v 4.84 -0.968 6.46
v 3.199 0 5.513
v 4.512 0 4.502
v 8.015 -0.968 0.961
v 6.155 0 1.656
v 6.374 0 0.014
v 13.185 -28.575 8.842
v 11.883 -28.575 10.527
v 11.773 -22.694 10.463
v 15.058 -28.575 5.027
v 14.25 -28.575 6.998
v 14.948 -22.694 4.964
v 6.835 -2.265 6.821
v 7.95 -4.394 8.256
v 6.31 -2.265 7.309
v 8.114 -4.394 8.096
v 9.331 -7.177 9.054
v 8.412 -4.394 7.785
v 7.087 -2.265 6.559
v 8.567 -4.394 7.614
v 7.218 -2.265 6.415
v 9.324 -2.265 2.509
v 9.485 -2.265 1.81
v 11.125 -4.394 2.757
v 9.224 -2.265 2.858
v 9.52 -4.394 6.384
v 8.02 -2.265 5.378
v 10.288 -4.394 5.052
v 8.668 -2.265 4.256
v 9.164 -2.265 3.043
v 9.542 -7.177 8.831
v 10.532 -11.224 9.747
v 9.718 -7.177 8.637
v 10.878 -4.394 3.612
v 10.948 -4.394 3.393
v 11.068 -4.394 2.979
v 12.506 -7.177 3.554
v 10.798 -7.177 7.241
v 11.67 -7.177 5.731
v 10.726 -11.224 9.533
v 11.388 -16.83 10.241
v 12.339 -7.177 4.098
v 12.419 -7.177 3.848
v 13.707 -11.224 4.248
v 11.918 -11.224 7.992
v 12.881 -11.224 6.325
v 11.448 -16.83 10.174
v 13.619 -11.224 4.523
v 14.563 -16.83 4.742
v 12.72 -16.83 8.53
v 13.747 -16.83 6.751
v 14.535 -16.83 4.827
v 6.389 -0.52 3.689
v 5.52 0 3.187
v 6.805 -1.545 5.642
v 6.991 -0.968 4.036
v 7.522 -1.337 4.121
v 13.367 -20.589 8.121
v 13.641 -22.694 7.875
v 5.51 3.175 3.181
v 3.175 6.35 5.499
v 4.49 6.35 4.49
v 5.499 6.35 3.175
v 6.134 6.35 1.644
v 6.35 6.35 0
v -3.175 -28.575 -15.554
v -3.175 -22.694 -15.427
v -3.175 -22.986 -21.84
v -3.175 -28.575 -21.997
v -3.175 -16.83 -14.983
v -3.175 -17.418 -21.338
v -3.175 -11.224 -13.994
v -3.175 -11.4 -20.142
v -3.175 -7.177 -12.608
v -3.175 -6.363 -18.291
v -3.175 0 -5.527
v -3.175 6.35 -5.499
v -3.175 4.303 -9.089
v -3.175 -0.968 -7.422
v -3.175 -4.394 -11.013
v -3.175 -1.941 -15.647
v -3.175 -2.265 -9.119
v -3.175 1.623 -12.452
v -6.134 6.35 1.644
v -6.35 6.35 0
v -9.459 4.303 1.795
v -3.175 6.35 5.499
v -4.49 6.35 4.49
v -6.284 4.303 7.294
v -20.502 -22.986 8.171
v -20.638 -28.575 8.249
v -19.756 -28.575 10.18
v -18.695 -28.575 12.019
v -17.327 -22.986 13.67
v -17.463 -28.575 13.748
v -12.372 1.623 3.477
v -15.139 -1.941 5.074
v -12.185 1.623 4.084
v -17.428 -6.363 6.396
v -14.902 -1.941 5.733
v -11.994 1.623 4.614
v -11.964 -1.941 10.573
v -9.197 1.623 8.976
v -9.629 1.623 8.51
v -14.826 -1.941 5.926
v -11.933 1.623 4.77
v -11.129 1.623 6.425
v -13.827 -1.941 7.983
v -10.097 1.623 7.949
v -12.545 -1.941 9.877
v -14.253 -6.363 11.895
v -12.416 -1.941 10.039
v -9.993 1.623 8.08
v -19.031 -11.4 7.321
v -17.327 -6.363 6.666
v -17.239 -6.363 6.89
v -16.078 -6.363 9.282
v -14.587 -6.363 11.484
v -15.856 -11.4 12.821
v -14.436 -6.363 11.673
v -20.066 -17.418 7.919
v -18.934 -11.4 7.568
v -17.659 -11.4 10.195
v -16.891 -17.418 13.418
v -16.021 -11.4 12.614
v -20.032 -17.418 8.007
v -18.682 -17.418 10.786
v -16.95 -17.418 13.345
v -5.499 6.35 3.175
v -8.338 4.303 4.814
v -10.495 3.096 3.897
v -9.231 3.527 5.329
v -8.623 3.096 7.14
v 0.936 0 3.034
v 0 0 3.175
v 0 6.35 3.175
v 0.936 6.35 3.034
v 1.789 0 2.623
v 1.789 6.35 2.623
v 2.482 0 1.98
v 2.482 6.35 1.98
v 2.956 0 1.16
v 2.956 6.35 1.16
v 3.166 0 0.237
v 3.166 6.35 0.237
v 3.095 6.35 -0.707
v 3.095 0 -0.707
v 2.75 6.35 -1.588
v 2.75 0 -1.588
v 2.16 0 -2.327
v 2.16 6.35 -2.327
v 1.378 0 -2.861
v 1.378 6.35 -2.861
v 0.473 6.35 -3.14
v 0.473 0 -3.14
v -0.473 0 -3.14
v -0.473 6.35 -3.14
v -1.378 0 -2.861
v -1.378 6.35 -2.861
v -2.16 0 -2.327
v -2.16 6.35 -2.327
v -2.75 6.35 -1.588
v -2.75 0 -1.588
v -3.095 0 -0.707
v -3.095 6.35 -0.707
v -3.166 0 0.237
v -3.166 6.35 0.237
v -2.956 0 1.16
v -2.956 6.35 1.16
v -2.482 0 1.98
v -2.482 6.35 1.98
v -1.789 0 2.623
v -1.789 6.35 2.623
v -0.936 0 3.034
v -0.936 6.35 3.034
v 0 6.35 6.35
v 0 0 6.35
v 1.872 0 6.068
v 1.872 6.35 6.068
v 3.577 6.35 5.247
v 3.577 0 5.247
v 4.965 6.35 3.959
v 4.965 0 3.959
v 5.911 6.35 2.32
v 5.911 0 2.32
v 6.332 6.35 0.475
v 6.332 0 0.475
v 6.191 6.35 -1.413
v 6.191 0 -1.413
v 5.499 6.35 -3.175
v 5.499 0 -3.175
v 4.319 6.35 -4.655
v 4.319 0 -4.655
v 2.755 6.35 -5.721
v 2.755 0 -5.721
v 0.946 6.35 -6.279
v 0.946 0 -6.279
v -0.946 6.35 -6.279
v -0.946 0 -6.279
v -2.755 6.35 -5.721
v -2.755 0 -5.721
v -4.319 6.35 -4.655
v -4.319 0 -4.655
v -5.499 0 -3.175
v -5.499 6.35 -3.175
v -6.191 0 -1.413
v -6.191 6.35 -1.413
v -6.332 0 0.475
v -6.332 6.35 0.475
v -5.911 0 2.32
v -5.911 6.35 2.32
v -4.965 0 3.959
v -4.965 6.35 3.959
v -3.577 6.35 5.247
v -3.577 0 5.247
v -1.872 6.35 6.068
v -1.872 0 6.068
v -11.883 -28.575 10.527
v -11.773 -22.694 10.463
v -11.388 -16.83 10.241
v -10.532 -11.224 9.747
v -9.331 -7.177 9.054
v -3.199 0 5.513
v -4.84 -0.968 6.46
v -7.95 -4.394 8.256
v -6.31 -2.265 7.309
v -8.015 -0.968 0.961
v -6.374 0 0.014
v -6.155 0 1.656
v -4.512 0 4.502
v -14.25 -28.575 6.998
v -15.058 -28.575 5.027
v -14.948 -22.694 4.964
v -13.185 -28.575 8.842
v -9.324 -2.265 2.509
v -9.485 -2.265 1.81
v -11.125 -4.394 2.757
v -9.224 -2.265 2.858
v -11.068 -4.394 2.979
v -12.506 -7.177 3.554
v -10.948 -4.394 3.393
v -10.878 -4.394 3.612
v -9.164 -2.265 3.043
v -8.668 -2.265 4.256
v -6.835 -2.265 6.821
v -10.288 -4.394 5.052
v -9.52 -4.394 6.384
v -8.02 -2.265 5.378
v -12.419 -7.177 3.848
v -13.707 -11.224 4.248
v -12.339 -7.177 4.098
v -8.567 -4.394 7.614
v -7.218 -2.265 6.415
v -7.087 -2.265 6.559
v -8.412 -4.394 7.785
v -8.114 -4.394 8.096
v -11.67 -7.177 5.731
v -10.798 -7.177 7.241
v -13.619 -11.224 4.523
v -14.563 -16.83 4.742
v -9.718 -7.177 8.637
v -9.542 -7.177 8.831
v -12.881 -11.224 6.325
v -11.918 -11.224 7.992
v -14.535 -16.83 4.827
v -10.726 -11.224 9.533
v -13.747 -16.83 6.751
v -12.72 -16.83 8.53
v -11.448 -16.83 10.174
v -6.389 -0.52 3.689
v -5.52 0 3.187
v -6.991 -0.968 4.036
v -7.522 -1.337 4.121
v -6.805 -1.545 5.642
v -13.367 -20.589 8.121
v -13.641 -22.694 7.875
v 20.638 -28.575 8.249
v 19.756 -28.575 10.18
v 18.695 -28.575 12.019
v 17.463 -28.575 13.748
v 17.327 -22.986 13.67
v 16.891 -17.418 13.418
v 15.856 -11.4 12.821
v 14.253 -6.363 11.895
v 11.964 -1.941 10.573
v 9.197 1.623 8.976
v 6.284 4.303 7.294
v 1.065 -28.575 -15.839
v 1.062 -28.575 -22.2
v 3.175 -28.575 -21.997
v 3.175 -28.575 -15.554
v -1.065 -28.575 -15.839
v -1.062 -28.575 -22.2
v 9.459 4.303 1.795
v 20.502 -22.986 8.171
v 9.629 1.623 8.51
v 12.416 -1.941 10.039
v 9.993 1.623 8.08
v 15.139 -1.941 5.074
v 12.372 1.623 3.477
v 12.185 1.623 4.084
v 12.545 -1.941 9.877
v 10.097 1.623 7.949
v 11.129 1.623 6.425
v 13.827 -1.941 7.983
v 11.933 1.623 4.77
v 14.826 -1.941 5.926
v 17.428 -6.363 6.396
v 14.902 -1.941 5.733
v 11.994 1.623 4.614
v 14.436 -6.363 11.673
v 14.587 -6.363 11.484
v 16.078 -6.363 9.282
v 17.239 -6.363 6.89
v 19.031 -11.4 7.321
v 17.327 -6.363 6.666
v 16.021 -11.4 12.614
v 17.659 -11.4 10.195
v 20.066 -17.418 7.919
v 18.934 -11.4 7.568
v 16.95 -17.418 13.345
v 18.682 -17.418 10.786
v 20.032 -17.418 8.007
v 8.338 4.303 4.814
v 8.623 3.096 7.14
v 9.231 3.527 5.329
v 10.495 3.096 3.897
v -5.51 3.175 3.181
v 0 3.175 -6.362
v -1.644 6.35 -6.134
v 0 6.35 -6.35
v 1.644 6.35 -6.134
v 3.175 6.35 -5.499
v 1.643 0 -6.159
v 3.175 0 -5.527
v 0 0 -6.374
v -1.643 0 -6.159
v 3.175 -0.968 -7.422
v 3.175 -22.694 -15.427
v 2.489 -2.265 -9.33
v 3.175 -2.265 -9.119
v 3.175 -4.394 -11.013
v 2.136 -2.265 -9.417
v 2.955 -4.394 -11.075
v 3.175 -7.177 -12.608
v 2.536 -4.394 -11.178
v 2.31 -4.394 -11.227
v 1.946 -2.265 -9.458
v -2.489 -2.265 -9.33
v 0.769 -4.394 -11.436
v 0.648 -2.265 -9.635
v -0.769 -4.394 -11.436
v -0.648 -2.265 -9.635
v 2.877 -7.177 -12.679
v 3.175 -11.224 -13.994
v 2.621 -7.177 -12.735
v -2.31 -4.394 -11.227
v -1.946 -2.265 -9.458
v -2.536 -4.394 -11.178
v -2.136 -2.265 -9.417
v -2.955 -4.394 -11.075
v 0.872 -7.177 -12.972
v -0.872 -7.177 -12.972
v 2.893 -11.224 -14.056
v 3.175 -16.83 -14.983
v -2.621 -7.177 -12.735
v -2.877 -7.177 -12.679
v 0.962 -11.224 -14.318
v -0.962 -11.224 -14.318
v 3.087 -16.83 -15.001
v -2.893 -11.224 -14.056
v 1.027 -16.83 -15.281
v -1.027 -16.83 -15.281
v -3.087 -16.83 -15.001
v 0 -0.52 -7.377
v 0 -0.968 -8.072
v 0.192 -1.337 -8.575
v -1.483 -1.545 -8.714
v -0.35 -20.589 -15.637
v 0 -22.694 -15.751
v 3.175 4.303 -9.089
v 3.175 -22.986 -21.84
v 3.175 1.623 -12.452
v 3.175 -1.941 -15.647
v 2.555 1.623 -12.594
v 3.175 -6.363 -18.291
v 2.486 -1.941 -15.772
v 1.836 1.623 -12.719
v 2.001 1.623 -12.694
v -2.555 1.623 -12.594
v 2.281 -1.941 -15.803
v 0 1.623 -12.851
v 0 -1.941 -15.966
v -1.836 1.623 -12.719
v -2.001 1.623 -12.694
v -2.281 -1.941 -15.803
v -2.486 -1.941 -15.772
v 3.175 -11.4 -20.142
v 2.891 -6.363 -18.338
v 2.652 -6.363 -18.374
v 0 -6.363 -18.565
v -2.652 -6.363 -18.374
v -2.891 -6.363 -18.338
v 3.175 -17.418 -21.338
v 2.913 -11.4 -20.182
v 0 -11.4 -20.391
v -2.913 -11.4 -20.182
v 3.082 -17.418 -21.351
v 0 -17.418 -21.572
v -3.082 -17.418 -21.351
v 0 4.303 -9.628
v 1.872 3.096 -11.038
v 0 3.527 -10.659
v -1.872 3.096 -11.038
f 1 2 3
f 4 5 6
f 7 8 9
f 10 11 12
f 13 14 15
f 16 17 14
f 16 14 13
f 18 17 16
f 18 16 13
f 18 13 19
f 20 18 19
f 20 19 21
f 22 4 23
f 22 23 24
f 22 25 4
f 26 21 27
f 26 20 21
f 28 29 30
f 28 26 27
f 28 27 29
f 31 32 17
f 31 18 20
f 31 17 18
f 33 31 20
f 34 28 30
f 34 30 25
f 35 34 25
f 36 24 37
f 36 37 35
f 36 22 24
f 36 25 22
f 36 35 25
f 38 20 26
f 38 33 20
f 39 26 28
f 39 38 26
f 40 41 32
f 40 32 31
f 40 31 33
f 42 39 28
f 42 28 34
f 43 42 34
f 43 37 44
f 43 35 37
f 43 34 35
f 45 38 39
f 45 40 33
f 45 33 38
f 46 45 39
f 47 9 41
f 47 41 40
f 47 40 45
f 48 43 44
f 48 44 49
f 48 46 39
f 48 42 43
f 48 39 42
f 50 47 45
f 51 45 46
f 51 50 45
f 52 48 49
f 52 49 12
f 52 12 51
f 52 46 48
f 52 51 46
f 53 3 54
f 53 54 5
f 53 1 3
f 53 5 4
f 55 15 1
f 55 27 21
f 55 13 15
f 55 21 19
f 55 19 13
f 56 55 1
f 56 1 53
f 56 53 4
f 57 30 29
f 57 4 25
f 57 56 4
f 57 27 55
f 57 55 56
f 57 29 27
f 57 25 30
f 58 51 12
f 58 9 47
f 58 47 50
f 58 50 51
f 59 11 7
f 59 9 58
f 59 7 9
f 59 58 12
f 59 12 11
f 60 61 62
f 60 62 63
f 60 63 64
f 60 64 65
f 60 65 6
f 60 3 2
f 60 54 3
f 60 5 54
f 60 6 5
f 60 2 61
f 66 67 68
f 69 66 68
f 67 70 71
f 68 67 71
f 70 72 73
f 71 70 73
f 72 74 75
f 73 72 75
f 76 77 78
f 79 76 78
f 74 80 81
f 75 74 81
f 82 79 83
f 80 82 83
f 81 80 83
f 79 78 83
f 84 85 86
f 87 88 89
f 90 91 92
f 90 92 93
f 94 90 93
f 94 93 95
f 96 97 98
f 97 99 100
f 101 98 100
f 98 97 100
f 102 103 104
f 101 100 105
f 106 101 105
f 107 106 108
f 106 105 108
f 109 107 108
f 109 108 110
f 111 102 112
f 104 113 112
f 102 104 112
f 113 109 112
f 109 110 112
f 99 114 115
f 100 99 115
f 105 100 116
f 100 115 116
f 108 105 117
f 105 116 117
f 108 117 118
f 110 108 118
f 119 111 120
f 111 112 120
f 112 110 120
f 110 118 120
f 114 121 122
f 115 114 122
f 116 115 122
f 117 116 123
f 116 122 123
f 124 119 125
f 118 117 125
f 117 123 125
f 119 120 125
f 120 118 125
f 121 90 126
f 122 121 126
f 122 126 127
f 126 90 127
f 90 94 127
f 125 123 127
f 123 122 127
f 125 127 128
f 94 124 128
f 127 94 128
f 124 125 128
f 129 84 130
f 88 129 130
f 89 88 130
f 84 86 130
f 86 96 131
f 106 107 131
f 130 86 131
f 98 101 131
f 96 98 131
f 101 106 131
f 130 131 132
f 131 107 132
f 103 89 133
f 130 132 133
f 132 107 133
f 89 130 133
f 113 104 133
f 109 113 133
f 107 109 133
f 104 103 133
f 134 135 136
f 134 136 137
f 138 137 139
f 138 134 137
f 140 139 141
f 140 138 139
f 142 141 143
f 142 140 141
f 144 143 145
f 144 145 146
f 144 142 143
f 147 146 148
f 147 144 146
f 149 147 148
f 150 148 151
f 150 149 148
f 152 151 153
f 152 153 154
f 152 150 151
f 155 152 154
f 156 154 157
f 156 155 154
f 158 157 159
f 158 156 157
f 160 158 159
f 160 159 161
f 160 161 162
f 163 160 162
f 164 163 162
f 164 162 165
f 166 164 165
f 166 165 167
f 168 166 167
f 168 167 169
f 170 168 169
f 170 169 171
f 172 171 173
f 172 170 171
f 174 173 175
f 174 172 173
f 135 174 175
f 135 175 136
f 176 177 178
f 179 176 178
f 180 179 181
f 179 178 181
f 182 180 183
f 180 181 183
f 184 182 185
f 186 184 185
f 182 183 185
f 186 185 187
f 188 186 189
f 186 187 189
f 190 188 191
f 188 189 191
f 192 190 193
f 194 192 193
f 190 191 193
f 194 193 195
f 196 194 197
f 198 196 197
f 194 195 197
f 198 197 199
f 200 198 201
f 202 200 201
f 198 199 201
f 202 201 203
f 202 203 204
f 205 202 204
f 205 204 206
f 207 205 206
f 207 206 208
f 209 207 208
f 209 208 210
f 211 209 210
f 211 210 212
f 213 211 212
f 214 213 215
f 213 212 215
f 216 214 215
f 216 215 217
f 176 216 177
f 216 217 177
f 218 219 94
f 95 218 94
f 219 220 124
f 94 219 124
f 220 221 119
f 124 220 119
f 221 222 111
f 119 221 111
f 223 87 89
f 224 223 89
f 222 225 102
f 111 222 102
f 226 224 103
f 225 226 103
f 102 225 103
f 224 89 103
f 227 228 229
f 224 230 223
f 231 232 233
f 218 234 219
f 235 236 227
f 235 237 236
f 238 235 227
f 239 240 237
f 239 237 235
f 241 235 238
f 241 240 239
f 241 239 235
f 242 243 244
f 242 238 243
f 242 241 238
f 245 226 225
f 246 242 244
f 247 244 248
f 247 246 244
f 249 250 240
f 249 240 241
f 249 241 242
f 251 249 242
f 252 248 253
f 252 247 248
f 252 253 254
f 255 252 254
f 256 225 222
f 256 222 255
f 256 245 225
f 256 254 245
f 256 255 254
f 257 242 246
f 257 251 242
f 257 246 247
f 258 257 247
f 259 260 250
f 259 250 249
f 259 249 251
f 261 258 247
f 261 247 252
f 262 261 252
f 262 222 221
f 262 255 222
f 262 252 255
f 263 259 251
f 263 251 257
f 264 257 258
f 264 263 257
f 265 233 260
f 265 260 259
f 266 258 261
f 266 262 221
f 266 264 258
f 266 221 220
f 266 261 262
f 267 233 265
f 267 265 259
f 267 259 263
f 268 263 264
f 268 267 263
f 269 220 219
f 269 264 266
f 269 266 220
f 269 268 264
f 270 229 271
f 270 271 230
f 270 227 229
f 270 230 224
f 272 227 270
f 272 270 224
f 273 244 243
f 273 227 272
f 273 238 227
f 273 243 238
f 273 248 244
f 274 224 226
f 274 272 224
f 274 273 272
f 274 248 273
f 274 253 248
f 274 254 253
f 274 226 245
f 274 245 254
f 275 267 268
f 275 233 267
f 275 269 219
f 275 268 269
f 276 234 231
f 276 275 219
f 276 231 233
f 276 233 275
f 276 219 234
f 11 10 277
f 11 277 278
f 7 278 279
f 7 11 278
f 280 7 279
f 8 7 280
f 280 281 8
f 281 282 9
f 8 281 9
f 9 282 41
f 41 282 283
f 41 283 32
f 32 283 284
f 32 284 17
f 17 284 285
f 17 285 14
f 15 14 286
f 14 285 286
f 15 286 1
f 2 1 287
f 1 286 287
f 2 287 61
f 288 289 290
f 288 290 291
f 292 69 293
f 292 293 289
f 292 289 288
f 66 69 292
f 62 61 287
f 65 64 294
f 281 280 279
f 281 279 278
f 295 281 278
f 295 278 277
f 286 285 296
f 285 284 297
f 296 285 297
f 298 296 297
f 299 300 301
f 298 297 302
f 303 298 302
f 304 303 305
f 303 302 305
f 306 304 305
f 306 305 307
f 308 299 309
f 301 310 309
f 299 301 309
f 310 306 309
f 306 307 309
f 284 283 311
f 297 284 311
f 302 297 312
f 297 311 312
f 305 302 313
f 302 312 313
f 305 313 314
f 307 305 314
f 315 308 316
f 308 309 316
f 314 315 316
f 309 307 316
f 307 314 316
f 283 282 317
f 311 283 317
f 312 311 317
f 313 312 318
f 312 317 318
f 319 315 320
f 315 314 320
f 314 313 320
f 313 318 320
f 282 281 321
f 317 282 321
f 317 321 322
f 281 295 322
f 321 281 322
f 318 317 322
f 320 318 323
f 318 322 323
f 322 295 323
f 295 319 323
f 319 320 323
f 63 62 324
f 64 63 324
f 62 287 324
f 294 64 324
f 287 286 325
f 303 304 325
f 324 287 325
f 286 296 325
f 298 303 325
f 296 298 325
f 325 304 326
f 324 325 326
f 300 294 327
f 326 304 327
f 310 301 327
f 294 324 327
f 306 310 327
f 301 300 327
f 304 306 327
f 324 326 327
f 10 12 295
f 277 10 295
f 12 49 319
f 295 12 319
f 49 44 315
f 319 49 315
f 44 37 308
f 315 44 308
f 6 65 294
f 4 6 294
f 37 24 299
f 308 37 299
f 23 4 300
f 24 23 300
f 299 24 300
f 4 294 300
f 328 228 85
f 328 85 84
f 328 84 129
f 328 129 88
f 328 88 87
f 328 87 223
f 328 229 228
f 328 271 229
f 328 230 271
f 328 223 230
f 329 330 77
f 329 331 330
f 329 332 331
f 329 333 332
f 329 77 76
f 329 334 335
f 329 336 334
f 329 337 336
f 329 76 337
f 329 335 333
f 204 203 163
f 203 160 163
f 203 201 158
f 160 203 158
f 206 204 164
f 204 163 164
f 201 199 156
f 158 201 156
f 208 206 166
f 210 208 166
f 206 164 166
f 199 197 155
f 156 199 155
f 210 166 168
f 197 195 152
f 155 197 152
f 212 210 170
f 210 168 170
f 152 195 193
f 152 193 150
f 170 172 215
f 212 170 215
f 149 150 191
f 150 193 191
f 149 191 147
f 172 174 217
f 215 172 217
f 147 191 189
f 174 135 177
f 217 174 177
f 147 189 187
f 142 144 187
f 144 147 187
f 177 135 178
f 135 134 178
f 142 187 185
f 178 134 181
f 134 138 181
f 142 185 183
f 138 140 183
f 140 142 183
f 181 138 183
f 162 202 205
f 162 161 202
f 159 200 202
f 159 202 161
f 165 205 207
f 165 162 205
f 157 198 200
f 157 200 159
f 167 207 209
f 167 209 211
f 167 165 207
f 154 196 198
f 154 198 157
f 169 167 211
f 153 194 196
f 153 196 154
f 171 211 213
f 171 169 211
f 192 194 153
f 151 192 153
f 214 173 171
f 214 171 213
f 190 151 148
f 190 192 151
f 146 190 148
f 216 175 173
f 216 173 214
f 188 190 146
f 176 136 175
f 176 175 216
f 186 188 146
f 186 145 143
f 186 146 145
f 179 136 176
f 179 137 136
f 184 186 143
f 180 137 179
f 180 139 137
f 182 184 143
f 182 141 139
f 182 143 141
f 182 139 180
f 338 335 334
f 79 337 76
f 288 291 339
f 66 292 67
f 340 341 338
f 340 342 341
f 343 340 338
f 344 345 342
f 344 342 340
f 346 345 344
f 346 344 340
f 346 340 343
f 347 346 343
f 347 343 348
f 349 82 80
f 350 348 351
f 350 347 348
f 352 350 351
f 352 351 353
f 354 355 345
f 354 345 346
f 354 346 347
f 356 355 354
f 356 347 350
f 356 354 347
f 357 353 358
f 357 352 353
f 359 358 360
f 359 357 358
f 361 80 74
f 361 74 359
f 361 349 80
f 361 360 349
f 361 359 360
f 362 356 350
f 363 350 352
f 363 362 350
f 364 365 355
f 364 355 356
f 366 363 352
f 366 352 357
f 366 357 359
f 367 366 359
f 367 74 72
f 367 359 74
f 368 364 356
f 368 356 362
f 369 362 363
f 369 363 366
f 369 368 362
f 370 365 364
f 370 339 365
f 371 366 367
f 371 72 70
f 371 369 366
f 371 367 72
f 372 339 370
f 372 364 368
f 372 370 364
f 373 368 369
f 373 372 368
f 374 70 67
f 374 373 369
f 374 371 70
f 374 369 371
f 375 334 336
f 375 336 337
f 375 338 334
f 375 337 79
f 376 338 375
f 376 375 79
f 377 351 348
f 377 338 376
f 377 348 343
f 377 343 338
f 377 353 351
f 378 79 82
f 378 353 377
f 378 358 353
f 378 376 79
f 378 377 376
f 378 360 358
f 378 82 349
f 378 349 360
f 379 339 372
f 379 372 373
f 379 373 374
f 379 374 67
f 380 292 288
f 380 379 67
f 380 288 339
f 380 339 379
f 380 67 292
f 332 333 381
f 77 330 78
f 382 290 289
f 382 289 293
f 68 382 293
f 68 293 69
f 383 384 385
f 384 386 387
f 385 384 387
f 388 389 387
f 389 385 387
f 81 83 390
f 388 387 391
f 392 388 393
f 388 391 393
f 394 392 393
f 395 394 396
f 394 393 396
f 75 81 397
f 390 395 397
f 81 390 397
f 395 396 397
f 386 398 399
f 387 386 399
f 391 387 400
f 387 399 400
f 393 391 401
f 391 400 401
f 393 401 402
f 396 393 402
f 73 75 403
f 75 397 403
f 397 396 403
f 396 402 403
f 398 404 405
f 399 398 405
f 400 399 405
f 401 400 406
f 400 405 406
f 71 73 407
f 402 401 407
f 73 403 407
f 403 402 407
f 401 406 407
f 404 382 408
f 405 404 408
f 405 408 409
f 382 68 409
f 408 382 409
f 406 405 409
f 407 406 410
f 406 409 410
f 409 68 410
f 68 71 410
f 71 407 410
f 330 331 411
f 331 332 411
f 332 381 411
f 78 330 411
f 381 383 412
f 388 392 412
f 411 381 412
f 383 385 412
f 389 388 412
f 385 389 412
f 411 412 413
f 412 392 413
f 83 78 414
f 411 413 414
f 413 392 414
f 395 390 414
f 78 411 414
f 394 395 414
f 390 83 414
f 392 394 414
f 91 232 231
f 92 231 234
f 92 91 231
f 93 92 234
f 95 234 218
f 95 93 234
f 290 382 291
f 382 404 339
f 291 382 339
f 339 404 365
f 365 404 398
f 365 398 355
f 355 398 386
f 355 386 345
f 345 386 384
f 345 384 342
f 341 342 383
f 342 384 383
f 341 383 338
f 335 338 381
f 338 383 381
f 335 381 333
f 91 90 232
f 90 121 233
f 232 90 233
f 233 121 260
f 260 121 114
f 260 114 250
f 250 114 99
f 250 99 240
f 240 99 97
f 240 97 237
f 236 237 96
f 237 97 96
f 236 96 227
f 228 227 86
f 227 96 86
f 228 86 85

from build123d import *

# Parameters (mm, degrees)
SKETCH2_R           = 6.35
SKETCH2_R_2         = 3.175
BOSS_EXTRUDE1_DEPTH = 6.35
CUT_EXTRUDE1_DEPTH  = 47.985709432


with BuildPart() as part:
    # Sketch2 → Boss-Extrude1 (new body)
    with BuildSketch(Plane(origin=(0, 0, 0), x_dir=(1, 0, 0), z_dir=(0, 1, 0))):
        with Locations(Location((0, 0, 0), (0, 0, 270))):
            Circle(SKETCH2_R)
        with Locations(Location((0, 0, 0), (0, 0, 270))):
            Circle(SKETCH2_R_2, mode=Mode.SUBTRACT)
    extrude(amount=BOSS_EXTRUDE1_DEPTH)


with BuildPart() as body_2:
    # Sketch6 → Revolve1 (revolve)
    with BuildSketch(Plane.XY, mode=Mode.PRIVATE) as revolve1_sk:
        with BuildLine():
            Line((15.875, -28.575), (22.225, -28.575))
            add(Edge.make_bspline(
                [(6.35, 6.35), (7.467751563, 5.782243558), (18.756333032, -0.329761449), (22.102006344, -8.871607917), (22.225, -28.575)],
                knots=[0, 0, 0, 0, 0, 1, 1, 1, 1, 1], degree=4))
            Line((6.35, 6.35), (6.374007583, 0))
            add(Edge.make_bspline(
                [(6.374007583, 0), (7.73903602, -0.567756442), (13.445964189, -3.811497044), (15.810261971, -9.729776165), (15.875, -28.575)],
                knots=[0, 0, 0, 0, 0, 1, 1, 1, 1, 1], degree=4))
        make_face()
    revolve(revolve1_sk.sketch.rotate(Axis((0, 0, 0), (0, 1, 0)), 90), axis=Axis((0, 0, 0), (0, 1, 0)))

    # Sketch8 → Cut-Extrude1 (cut, through all)
    with BuildSketch(Plane(origin=(0, 6.35, 0), x_dir=(1, 0, 0), z_dir=(0, 1, 0))):
        with BuildLine():
            ThreePointArc((-6.35, 0), (-5.499261314, 3.175), (-3.175, 5.499261314))
            Line((-3.175, 5.499261314), (-3.175, 21.997045256))
            ThreePointArc((-3.175, 21.997045256), (-19.247414599, 11.1125), (-20.6375, -8.248891971))
            Line((-20.6375, -8.248891971), (-6.35, 0))
        make_face()
        with BuildLine():
            Line((3.175, 21.997045256), (3.175, 5.499261314))
            ThreePointArc((3.175, 5.499261314), (5.499261314, 3.175), (6.35, 0))
            Line((6.35, 0), (20.6375, -8.248891971))
            ThreePointArc((20.6375, -8.248891971), (21.824516747, -4.200130206), (22.225, 0))
            ThreePointArc((22.225, 0), (16.800520825, 14.549677831), (3.175, 21.997045256))
        make_face()
        with BuildLine():
            ThreePointArc((3.175, -5.499261314), (0, -6.35), (-3.175, -5.499261314))
            Line((-3.175, -5.499261314), (-17.4625, -13.748153285))
            ThreePointArc((-17.4625, -13.748153285), (0, -22.225), (17.4625, -13.748153285))
            Line((17.4625, -13.748153285), (3.175, -5.499261314))
        make_face()
    extrude(amount=-CUT_EXTRUDE1_DEPTH, mode=Mode.SUBTRACT)


with BuildPart() as cut_extrude1_piece_1:
    # of the separate pieces the step leaves, piece 1, a body of its own (cut_extrude1_pieces)
    add(body_2.part.solids().sort_by_distance((-15.057884182, -28.575, 5.027499276))[0])


with BuildPart() as cut_extrude1_piece_2:
    # of the separate pieces the step leaves, piece 2, a body of its own (cut_extrude1_pieces)
    add(body_2.part.solids().sort_by_distance((11.882884182, -28.575, 10.52676059))[0])


with BuildPart() as cut_extrude1_piece_3:
    # of the separate pieces the step leaves, piece 3, a body of its own (cut_extrude1_pieces)
    add(body_2.part.solids().sort_by_distance((3.175, -28.575, -15.554259867))[0])


solid = Compound([part.part, cut_extrude1_piece_1.part, cut_extrude1_piece_2.part, cut_extrude1_piece_3.part])
